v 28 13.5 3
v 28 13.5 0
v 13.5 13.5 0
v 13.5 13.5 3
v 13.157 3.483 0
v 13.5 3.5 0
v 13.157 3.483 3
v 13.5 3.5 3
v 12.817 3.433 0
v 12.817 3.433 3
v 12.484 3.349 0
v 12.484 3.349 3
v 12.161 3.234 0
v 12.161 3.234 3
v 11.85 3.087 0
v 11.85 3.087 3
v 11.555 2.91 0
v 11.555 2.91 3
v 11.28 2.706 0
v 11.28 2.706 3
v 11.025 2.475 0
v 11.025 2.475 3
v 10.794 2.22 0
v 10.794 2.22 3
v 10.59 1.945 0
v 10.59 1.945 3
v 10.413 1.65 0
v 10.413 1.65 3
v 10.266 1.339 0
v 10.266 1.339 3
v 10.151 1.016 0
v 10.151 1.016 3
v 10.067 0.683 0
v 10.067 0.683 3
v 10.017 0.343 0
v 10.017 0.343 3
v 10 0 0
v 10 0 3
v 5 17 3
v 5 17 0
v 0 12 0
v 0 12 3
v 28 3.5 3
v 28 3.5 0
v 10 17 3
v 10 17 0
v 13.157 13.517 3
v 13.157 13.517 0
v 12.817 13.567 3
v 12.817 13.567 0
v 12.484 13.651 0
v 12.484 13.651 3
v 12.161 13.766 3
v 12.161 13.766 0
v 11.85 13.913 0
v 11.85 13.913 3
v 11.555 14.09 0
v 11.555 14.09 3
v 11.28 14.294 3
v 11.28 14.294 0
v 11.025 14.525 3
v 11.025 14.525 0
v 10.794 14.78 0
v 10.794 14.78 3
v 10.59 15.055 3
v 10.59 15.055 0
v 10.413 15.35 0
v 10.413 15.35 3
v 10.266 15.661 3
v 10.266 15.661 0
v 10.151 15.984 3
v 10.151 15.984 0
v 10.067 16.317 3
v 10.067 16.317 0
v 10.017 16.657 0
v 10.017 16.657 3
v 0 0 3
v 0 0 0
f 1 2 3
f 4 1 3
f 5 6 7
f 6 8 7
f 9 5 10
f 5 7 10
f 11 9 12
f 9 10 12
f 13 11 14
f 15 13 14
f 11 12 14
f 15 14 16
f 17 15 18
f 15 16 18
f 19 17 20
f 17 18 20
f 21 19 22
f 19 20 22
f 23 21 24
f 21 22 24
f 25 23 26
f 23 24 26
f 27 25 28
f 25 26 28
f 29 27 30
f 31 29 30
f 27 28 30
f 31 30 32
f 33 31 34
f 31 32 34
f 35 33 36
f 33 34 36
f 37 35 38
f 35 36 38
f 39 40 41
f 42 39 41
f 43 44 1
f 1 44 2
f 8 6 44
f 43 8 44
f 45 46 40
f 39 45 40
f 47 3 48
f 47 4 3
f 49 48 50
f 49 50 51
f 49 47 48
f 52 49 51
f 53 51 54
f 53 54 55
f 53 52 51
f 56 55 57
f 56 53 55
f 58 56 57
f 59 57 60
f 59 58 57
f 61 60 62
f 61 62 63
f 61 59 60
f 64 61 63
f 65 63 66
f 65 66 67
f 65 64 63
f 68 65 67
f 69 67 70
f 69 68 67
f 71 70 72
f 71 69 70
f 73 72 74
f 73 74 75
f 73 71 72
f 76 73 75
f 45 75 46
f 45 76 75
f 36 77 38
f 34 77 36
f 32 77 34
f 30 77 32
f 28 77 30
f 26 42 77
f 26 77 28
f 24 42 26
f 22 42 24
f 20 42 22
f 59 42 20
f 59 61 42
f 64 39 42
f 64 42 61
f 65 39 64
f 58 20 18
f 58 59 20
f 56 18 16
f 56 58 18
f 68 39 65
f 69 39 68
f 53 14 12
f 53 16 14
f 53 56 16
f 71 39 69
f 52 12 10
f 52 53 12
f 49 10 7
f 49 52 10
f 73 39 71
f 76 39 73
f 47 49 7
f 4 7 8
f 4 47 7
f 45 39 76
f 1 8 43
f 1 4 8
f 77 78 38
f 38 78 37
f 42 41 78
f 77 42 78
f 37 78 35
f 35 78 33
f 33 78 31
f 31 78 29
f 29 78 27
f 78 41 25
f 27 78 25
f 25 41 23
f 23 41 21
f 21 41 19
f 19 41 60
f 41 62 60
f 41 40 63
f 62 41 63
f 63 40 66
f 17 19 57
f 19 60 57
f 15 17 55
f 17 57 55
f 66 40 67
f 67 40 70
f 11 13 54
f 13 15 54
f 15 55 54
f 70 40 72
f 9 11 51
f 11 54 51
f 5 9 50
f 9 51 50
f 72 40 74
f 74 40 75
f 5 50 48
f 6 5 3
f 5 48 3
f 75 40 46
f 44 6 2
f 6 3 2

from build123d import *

# Parameters (mm, degrees)
F1_DEPTH = 3
F2_R     = 3.49999
F3_R     = 3.49999


# Not quite as in the source:
# - a fillet or chamfer is up to 0.001 mm smaller than in the source, because OpenCascade refuses the exact size


with BuildPart() as f1:
    # F0 (on Top) → F1 (new body)
    with BuildSketch(Plane.XY):
        Polygon((0, 12), (0, 0), (10, 0), (10, 3.5), (28, 3.5), (28, 13.5), (10, 13.5), (10, 17), (5, 17), align=None)
    extrude(amount=F1_DEPTH)

    # F2 (radius 3.5 in the source; OpenCascade refuses exactly that, so slightly less here)
    f2_edges = [f1.edges().sort_by_distance(p)[0] for p in [
        (10, 13.5, 1.5),
    ]]
    fillet(f2_edges, radius=F2_R)

    # F3 (radius 3.5 in the source; OpenCascade refuses exactly that, so slightly less here)
    f3_edges = [f1.edges().sort_by_distance(p)[0] for p in [
        (10, 3.5, 1.5),
    ]]
    fillet(f3_edges, radius=F3_R)


solid = f1.part
